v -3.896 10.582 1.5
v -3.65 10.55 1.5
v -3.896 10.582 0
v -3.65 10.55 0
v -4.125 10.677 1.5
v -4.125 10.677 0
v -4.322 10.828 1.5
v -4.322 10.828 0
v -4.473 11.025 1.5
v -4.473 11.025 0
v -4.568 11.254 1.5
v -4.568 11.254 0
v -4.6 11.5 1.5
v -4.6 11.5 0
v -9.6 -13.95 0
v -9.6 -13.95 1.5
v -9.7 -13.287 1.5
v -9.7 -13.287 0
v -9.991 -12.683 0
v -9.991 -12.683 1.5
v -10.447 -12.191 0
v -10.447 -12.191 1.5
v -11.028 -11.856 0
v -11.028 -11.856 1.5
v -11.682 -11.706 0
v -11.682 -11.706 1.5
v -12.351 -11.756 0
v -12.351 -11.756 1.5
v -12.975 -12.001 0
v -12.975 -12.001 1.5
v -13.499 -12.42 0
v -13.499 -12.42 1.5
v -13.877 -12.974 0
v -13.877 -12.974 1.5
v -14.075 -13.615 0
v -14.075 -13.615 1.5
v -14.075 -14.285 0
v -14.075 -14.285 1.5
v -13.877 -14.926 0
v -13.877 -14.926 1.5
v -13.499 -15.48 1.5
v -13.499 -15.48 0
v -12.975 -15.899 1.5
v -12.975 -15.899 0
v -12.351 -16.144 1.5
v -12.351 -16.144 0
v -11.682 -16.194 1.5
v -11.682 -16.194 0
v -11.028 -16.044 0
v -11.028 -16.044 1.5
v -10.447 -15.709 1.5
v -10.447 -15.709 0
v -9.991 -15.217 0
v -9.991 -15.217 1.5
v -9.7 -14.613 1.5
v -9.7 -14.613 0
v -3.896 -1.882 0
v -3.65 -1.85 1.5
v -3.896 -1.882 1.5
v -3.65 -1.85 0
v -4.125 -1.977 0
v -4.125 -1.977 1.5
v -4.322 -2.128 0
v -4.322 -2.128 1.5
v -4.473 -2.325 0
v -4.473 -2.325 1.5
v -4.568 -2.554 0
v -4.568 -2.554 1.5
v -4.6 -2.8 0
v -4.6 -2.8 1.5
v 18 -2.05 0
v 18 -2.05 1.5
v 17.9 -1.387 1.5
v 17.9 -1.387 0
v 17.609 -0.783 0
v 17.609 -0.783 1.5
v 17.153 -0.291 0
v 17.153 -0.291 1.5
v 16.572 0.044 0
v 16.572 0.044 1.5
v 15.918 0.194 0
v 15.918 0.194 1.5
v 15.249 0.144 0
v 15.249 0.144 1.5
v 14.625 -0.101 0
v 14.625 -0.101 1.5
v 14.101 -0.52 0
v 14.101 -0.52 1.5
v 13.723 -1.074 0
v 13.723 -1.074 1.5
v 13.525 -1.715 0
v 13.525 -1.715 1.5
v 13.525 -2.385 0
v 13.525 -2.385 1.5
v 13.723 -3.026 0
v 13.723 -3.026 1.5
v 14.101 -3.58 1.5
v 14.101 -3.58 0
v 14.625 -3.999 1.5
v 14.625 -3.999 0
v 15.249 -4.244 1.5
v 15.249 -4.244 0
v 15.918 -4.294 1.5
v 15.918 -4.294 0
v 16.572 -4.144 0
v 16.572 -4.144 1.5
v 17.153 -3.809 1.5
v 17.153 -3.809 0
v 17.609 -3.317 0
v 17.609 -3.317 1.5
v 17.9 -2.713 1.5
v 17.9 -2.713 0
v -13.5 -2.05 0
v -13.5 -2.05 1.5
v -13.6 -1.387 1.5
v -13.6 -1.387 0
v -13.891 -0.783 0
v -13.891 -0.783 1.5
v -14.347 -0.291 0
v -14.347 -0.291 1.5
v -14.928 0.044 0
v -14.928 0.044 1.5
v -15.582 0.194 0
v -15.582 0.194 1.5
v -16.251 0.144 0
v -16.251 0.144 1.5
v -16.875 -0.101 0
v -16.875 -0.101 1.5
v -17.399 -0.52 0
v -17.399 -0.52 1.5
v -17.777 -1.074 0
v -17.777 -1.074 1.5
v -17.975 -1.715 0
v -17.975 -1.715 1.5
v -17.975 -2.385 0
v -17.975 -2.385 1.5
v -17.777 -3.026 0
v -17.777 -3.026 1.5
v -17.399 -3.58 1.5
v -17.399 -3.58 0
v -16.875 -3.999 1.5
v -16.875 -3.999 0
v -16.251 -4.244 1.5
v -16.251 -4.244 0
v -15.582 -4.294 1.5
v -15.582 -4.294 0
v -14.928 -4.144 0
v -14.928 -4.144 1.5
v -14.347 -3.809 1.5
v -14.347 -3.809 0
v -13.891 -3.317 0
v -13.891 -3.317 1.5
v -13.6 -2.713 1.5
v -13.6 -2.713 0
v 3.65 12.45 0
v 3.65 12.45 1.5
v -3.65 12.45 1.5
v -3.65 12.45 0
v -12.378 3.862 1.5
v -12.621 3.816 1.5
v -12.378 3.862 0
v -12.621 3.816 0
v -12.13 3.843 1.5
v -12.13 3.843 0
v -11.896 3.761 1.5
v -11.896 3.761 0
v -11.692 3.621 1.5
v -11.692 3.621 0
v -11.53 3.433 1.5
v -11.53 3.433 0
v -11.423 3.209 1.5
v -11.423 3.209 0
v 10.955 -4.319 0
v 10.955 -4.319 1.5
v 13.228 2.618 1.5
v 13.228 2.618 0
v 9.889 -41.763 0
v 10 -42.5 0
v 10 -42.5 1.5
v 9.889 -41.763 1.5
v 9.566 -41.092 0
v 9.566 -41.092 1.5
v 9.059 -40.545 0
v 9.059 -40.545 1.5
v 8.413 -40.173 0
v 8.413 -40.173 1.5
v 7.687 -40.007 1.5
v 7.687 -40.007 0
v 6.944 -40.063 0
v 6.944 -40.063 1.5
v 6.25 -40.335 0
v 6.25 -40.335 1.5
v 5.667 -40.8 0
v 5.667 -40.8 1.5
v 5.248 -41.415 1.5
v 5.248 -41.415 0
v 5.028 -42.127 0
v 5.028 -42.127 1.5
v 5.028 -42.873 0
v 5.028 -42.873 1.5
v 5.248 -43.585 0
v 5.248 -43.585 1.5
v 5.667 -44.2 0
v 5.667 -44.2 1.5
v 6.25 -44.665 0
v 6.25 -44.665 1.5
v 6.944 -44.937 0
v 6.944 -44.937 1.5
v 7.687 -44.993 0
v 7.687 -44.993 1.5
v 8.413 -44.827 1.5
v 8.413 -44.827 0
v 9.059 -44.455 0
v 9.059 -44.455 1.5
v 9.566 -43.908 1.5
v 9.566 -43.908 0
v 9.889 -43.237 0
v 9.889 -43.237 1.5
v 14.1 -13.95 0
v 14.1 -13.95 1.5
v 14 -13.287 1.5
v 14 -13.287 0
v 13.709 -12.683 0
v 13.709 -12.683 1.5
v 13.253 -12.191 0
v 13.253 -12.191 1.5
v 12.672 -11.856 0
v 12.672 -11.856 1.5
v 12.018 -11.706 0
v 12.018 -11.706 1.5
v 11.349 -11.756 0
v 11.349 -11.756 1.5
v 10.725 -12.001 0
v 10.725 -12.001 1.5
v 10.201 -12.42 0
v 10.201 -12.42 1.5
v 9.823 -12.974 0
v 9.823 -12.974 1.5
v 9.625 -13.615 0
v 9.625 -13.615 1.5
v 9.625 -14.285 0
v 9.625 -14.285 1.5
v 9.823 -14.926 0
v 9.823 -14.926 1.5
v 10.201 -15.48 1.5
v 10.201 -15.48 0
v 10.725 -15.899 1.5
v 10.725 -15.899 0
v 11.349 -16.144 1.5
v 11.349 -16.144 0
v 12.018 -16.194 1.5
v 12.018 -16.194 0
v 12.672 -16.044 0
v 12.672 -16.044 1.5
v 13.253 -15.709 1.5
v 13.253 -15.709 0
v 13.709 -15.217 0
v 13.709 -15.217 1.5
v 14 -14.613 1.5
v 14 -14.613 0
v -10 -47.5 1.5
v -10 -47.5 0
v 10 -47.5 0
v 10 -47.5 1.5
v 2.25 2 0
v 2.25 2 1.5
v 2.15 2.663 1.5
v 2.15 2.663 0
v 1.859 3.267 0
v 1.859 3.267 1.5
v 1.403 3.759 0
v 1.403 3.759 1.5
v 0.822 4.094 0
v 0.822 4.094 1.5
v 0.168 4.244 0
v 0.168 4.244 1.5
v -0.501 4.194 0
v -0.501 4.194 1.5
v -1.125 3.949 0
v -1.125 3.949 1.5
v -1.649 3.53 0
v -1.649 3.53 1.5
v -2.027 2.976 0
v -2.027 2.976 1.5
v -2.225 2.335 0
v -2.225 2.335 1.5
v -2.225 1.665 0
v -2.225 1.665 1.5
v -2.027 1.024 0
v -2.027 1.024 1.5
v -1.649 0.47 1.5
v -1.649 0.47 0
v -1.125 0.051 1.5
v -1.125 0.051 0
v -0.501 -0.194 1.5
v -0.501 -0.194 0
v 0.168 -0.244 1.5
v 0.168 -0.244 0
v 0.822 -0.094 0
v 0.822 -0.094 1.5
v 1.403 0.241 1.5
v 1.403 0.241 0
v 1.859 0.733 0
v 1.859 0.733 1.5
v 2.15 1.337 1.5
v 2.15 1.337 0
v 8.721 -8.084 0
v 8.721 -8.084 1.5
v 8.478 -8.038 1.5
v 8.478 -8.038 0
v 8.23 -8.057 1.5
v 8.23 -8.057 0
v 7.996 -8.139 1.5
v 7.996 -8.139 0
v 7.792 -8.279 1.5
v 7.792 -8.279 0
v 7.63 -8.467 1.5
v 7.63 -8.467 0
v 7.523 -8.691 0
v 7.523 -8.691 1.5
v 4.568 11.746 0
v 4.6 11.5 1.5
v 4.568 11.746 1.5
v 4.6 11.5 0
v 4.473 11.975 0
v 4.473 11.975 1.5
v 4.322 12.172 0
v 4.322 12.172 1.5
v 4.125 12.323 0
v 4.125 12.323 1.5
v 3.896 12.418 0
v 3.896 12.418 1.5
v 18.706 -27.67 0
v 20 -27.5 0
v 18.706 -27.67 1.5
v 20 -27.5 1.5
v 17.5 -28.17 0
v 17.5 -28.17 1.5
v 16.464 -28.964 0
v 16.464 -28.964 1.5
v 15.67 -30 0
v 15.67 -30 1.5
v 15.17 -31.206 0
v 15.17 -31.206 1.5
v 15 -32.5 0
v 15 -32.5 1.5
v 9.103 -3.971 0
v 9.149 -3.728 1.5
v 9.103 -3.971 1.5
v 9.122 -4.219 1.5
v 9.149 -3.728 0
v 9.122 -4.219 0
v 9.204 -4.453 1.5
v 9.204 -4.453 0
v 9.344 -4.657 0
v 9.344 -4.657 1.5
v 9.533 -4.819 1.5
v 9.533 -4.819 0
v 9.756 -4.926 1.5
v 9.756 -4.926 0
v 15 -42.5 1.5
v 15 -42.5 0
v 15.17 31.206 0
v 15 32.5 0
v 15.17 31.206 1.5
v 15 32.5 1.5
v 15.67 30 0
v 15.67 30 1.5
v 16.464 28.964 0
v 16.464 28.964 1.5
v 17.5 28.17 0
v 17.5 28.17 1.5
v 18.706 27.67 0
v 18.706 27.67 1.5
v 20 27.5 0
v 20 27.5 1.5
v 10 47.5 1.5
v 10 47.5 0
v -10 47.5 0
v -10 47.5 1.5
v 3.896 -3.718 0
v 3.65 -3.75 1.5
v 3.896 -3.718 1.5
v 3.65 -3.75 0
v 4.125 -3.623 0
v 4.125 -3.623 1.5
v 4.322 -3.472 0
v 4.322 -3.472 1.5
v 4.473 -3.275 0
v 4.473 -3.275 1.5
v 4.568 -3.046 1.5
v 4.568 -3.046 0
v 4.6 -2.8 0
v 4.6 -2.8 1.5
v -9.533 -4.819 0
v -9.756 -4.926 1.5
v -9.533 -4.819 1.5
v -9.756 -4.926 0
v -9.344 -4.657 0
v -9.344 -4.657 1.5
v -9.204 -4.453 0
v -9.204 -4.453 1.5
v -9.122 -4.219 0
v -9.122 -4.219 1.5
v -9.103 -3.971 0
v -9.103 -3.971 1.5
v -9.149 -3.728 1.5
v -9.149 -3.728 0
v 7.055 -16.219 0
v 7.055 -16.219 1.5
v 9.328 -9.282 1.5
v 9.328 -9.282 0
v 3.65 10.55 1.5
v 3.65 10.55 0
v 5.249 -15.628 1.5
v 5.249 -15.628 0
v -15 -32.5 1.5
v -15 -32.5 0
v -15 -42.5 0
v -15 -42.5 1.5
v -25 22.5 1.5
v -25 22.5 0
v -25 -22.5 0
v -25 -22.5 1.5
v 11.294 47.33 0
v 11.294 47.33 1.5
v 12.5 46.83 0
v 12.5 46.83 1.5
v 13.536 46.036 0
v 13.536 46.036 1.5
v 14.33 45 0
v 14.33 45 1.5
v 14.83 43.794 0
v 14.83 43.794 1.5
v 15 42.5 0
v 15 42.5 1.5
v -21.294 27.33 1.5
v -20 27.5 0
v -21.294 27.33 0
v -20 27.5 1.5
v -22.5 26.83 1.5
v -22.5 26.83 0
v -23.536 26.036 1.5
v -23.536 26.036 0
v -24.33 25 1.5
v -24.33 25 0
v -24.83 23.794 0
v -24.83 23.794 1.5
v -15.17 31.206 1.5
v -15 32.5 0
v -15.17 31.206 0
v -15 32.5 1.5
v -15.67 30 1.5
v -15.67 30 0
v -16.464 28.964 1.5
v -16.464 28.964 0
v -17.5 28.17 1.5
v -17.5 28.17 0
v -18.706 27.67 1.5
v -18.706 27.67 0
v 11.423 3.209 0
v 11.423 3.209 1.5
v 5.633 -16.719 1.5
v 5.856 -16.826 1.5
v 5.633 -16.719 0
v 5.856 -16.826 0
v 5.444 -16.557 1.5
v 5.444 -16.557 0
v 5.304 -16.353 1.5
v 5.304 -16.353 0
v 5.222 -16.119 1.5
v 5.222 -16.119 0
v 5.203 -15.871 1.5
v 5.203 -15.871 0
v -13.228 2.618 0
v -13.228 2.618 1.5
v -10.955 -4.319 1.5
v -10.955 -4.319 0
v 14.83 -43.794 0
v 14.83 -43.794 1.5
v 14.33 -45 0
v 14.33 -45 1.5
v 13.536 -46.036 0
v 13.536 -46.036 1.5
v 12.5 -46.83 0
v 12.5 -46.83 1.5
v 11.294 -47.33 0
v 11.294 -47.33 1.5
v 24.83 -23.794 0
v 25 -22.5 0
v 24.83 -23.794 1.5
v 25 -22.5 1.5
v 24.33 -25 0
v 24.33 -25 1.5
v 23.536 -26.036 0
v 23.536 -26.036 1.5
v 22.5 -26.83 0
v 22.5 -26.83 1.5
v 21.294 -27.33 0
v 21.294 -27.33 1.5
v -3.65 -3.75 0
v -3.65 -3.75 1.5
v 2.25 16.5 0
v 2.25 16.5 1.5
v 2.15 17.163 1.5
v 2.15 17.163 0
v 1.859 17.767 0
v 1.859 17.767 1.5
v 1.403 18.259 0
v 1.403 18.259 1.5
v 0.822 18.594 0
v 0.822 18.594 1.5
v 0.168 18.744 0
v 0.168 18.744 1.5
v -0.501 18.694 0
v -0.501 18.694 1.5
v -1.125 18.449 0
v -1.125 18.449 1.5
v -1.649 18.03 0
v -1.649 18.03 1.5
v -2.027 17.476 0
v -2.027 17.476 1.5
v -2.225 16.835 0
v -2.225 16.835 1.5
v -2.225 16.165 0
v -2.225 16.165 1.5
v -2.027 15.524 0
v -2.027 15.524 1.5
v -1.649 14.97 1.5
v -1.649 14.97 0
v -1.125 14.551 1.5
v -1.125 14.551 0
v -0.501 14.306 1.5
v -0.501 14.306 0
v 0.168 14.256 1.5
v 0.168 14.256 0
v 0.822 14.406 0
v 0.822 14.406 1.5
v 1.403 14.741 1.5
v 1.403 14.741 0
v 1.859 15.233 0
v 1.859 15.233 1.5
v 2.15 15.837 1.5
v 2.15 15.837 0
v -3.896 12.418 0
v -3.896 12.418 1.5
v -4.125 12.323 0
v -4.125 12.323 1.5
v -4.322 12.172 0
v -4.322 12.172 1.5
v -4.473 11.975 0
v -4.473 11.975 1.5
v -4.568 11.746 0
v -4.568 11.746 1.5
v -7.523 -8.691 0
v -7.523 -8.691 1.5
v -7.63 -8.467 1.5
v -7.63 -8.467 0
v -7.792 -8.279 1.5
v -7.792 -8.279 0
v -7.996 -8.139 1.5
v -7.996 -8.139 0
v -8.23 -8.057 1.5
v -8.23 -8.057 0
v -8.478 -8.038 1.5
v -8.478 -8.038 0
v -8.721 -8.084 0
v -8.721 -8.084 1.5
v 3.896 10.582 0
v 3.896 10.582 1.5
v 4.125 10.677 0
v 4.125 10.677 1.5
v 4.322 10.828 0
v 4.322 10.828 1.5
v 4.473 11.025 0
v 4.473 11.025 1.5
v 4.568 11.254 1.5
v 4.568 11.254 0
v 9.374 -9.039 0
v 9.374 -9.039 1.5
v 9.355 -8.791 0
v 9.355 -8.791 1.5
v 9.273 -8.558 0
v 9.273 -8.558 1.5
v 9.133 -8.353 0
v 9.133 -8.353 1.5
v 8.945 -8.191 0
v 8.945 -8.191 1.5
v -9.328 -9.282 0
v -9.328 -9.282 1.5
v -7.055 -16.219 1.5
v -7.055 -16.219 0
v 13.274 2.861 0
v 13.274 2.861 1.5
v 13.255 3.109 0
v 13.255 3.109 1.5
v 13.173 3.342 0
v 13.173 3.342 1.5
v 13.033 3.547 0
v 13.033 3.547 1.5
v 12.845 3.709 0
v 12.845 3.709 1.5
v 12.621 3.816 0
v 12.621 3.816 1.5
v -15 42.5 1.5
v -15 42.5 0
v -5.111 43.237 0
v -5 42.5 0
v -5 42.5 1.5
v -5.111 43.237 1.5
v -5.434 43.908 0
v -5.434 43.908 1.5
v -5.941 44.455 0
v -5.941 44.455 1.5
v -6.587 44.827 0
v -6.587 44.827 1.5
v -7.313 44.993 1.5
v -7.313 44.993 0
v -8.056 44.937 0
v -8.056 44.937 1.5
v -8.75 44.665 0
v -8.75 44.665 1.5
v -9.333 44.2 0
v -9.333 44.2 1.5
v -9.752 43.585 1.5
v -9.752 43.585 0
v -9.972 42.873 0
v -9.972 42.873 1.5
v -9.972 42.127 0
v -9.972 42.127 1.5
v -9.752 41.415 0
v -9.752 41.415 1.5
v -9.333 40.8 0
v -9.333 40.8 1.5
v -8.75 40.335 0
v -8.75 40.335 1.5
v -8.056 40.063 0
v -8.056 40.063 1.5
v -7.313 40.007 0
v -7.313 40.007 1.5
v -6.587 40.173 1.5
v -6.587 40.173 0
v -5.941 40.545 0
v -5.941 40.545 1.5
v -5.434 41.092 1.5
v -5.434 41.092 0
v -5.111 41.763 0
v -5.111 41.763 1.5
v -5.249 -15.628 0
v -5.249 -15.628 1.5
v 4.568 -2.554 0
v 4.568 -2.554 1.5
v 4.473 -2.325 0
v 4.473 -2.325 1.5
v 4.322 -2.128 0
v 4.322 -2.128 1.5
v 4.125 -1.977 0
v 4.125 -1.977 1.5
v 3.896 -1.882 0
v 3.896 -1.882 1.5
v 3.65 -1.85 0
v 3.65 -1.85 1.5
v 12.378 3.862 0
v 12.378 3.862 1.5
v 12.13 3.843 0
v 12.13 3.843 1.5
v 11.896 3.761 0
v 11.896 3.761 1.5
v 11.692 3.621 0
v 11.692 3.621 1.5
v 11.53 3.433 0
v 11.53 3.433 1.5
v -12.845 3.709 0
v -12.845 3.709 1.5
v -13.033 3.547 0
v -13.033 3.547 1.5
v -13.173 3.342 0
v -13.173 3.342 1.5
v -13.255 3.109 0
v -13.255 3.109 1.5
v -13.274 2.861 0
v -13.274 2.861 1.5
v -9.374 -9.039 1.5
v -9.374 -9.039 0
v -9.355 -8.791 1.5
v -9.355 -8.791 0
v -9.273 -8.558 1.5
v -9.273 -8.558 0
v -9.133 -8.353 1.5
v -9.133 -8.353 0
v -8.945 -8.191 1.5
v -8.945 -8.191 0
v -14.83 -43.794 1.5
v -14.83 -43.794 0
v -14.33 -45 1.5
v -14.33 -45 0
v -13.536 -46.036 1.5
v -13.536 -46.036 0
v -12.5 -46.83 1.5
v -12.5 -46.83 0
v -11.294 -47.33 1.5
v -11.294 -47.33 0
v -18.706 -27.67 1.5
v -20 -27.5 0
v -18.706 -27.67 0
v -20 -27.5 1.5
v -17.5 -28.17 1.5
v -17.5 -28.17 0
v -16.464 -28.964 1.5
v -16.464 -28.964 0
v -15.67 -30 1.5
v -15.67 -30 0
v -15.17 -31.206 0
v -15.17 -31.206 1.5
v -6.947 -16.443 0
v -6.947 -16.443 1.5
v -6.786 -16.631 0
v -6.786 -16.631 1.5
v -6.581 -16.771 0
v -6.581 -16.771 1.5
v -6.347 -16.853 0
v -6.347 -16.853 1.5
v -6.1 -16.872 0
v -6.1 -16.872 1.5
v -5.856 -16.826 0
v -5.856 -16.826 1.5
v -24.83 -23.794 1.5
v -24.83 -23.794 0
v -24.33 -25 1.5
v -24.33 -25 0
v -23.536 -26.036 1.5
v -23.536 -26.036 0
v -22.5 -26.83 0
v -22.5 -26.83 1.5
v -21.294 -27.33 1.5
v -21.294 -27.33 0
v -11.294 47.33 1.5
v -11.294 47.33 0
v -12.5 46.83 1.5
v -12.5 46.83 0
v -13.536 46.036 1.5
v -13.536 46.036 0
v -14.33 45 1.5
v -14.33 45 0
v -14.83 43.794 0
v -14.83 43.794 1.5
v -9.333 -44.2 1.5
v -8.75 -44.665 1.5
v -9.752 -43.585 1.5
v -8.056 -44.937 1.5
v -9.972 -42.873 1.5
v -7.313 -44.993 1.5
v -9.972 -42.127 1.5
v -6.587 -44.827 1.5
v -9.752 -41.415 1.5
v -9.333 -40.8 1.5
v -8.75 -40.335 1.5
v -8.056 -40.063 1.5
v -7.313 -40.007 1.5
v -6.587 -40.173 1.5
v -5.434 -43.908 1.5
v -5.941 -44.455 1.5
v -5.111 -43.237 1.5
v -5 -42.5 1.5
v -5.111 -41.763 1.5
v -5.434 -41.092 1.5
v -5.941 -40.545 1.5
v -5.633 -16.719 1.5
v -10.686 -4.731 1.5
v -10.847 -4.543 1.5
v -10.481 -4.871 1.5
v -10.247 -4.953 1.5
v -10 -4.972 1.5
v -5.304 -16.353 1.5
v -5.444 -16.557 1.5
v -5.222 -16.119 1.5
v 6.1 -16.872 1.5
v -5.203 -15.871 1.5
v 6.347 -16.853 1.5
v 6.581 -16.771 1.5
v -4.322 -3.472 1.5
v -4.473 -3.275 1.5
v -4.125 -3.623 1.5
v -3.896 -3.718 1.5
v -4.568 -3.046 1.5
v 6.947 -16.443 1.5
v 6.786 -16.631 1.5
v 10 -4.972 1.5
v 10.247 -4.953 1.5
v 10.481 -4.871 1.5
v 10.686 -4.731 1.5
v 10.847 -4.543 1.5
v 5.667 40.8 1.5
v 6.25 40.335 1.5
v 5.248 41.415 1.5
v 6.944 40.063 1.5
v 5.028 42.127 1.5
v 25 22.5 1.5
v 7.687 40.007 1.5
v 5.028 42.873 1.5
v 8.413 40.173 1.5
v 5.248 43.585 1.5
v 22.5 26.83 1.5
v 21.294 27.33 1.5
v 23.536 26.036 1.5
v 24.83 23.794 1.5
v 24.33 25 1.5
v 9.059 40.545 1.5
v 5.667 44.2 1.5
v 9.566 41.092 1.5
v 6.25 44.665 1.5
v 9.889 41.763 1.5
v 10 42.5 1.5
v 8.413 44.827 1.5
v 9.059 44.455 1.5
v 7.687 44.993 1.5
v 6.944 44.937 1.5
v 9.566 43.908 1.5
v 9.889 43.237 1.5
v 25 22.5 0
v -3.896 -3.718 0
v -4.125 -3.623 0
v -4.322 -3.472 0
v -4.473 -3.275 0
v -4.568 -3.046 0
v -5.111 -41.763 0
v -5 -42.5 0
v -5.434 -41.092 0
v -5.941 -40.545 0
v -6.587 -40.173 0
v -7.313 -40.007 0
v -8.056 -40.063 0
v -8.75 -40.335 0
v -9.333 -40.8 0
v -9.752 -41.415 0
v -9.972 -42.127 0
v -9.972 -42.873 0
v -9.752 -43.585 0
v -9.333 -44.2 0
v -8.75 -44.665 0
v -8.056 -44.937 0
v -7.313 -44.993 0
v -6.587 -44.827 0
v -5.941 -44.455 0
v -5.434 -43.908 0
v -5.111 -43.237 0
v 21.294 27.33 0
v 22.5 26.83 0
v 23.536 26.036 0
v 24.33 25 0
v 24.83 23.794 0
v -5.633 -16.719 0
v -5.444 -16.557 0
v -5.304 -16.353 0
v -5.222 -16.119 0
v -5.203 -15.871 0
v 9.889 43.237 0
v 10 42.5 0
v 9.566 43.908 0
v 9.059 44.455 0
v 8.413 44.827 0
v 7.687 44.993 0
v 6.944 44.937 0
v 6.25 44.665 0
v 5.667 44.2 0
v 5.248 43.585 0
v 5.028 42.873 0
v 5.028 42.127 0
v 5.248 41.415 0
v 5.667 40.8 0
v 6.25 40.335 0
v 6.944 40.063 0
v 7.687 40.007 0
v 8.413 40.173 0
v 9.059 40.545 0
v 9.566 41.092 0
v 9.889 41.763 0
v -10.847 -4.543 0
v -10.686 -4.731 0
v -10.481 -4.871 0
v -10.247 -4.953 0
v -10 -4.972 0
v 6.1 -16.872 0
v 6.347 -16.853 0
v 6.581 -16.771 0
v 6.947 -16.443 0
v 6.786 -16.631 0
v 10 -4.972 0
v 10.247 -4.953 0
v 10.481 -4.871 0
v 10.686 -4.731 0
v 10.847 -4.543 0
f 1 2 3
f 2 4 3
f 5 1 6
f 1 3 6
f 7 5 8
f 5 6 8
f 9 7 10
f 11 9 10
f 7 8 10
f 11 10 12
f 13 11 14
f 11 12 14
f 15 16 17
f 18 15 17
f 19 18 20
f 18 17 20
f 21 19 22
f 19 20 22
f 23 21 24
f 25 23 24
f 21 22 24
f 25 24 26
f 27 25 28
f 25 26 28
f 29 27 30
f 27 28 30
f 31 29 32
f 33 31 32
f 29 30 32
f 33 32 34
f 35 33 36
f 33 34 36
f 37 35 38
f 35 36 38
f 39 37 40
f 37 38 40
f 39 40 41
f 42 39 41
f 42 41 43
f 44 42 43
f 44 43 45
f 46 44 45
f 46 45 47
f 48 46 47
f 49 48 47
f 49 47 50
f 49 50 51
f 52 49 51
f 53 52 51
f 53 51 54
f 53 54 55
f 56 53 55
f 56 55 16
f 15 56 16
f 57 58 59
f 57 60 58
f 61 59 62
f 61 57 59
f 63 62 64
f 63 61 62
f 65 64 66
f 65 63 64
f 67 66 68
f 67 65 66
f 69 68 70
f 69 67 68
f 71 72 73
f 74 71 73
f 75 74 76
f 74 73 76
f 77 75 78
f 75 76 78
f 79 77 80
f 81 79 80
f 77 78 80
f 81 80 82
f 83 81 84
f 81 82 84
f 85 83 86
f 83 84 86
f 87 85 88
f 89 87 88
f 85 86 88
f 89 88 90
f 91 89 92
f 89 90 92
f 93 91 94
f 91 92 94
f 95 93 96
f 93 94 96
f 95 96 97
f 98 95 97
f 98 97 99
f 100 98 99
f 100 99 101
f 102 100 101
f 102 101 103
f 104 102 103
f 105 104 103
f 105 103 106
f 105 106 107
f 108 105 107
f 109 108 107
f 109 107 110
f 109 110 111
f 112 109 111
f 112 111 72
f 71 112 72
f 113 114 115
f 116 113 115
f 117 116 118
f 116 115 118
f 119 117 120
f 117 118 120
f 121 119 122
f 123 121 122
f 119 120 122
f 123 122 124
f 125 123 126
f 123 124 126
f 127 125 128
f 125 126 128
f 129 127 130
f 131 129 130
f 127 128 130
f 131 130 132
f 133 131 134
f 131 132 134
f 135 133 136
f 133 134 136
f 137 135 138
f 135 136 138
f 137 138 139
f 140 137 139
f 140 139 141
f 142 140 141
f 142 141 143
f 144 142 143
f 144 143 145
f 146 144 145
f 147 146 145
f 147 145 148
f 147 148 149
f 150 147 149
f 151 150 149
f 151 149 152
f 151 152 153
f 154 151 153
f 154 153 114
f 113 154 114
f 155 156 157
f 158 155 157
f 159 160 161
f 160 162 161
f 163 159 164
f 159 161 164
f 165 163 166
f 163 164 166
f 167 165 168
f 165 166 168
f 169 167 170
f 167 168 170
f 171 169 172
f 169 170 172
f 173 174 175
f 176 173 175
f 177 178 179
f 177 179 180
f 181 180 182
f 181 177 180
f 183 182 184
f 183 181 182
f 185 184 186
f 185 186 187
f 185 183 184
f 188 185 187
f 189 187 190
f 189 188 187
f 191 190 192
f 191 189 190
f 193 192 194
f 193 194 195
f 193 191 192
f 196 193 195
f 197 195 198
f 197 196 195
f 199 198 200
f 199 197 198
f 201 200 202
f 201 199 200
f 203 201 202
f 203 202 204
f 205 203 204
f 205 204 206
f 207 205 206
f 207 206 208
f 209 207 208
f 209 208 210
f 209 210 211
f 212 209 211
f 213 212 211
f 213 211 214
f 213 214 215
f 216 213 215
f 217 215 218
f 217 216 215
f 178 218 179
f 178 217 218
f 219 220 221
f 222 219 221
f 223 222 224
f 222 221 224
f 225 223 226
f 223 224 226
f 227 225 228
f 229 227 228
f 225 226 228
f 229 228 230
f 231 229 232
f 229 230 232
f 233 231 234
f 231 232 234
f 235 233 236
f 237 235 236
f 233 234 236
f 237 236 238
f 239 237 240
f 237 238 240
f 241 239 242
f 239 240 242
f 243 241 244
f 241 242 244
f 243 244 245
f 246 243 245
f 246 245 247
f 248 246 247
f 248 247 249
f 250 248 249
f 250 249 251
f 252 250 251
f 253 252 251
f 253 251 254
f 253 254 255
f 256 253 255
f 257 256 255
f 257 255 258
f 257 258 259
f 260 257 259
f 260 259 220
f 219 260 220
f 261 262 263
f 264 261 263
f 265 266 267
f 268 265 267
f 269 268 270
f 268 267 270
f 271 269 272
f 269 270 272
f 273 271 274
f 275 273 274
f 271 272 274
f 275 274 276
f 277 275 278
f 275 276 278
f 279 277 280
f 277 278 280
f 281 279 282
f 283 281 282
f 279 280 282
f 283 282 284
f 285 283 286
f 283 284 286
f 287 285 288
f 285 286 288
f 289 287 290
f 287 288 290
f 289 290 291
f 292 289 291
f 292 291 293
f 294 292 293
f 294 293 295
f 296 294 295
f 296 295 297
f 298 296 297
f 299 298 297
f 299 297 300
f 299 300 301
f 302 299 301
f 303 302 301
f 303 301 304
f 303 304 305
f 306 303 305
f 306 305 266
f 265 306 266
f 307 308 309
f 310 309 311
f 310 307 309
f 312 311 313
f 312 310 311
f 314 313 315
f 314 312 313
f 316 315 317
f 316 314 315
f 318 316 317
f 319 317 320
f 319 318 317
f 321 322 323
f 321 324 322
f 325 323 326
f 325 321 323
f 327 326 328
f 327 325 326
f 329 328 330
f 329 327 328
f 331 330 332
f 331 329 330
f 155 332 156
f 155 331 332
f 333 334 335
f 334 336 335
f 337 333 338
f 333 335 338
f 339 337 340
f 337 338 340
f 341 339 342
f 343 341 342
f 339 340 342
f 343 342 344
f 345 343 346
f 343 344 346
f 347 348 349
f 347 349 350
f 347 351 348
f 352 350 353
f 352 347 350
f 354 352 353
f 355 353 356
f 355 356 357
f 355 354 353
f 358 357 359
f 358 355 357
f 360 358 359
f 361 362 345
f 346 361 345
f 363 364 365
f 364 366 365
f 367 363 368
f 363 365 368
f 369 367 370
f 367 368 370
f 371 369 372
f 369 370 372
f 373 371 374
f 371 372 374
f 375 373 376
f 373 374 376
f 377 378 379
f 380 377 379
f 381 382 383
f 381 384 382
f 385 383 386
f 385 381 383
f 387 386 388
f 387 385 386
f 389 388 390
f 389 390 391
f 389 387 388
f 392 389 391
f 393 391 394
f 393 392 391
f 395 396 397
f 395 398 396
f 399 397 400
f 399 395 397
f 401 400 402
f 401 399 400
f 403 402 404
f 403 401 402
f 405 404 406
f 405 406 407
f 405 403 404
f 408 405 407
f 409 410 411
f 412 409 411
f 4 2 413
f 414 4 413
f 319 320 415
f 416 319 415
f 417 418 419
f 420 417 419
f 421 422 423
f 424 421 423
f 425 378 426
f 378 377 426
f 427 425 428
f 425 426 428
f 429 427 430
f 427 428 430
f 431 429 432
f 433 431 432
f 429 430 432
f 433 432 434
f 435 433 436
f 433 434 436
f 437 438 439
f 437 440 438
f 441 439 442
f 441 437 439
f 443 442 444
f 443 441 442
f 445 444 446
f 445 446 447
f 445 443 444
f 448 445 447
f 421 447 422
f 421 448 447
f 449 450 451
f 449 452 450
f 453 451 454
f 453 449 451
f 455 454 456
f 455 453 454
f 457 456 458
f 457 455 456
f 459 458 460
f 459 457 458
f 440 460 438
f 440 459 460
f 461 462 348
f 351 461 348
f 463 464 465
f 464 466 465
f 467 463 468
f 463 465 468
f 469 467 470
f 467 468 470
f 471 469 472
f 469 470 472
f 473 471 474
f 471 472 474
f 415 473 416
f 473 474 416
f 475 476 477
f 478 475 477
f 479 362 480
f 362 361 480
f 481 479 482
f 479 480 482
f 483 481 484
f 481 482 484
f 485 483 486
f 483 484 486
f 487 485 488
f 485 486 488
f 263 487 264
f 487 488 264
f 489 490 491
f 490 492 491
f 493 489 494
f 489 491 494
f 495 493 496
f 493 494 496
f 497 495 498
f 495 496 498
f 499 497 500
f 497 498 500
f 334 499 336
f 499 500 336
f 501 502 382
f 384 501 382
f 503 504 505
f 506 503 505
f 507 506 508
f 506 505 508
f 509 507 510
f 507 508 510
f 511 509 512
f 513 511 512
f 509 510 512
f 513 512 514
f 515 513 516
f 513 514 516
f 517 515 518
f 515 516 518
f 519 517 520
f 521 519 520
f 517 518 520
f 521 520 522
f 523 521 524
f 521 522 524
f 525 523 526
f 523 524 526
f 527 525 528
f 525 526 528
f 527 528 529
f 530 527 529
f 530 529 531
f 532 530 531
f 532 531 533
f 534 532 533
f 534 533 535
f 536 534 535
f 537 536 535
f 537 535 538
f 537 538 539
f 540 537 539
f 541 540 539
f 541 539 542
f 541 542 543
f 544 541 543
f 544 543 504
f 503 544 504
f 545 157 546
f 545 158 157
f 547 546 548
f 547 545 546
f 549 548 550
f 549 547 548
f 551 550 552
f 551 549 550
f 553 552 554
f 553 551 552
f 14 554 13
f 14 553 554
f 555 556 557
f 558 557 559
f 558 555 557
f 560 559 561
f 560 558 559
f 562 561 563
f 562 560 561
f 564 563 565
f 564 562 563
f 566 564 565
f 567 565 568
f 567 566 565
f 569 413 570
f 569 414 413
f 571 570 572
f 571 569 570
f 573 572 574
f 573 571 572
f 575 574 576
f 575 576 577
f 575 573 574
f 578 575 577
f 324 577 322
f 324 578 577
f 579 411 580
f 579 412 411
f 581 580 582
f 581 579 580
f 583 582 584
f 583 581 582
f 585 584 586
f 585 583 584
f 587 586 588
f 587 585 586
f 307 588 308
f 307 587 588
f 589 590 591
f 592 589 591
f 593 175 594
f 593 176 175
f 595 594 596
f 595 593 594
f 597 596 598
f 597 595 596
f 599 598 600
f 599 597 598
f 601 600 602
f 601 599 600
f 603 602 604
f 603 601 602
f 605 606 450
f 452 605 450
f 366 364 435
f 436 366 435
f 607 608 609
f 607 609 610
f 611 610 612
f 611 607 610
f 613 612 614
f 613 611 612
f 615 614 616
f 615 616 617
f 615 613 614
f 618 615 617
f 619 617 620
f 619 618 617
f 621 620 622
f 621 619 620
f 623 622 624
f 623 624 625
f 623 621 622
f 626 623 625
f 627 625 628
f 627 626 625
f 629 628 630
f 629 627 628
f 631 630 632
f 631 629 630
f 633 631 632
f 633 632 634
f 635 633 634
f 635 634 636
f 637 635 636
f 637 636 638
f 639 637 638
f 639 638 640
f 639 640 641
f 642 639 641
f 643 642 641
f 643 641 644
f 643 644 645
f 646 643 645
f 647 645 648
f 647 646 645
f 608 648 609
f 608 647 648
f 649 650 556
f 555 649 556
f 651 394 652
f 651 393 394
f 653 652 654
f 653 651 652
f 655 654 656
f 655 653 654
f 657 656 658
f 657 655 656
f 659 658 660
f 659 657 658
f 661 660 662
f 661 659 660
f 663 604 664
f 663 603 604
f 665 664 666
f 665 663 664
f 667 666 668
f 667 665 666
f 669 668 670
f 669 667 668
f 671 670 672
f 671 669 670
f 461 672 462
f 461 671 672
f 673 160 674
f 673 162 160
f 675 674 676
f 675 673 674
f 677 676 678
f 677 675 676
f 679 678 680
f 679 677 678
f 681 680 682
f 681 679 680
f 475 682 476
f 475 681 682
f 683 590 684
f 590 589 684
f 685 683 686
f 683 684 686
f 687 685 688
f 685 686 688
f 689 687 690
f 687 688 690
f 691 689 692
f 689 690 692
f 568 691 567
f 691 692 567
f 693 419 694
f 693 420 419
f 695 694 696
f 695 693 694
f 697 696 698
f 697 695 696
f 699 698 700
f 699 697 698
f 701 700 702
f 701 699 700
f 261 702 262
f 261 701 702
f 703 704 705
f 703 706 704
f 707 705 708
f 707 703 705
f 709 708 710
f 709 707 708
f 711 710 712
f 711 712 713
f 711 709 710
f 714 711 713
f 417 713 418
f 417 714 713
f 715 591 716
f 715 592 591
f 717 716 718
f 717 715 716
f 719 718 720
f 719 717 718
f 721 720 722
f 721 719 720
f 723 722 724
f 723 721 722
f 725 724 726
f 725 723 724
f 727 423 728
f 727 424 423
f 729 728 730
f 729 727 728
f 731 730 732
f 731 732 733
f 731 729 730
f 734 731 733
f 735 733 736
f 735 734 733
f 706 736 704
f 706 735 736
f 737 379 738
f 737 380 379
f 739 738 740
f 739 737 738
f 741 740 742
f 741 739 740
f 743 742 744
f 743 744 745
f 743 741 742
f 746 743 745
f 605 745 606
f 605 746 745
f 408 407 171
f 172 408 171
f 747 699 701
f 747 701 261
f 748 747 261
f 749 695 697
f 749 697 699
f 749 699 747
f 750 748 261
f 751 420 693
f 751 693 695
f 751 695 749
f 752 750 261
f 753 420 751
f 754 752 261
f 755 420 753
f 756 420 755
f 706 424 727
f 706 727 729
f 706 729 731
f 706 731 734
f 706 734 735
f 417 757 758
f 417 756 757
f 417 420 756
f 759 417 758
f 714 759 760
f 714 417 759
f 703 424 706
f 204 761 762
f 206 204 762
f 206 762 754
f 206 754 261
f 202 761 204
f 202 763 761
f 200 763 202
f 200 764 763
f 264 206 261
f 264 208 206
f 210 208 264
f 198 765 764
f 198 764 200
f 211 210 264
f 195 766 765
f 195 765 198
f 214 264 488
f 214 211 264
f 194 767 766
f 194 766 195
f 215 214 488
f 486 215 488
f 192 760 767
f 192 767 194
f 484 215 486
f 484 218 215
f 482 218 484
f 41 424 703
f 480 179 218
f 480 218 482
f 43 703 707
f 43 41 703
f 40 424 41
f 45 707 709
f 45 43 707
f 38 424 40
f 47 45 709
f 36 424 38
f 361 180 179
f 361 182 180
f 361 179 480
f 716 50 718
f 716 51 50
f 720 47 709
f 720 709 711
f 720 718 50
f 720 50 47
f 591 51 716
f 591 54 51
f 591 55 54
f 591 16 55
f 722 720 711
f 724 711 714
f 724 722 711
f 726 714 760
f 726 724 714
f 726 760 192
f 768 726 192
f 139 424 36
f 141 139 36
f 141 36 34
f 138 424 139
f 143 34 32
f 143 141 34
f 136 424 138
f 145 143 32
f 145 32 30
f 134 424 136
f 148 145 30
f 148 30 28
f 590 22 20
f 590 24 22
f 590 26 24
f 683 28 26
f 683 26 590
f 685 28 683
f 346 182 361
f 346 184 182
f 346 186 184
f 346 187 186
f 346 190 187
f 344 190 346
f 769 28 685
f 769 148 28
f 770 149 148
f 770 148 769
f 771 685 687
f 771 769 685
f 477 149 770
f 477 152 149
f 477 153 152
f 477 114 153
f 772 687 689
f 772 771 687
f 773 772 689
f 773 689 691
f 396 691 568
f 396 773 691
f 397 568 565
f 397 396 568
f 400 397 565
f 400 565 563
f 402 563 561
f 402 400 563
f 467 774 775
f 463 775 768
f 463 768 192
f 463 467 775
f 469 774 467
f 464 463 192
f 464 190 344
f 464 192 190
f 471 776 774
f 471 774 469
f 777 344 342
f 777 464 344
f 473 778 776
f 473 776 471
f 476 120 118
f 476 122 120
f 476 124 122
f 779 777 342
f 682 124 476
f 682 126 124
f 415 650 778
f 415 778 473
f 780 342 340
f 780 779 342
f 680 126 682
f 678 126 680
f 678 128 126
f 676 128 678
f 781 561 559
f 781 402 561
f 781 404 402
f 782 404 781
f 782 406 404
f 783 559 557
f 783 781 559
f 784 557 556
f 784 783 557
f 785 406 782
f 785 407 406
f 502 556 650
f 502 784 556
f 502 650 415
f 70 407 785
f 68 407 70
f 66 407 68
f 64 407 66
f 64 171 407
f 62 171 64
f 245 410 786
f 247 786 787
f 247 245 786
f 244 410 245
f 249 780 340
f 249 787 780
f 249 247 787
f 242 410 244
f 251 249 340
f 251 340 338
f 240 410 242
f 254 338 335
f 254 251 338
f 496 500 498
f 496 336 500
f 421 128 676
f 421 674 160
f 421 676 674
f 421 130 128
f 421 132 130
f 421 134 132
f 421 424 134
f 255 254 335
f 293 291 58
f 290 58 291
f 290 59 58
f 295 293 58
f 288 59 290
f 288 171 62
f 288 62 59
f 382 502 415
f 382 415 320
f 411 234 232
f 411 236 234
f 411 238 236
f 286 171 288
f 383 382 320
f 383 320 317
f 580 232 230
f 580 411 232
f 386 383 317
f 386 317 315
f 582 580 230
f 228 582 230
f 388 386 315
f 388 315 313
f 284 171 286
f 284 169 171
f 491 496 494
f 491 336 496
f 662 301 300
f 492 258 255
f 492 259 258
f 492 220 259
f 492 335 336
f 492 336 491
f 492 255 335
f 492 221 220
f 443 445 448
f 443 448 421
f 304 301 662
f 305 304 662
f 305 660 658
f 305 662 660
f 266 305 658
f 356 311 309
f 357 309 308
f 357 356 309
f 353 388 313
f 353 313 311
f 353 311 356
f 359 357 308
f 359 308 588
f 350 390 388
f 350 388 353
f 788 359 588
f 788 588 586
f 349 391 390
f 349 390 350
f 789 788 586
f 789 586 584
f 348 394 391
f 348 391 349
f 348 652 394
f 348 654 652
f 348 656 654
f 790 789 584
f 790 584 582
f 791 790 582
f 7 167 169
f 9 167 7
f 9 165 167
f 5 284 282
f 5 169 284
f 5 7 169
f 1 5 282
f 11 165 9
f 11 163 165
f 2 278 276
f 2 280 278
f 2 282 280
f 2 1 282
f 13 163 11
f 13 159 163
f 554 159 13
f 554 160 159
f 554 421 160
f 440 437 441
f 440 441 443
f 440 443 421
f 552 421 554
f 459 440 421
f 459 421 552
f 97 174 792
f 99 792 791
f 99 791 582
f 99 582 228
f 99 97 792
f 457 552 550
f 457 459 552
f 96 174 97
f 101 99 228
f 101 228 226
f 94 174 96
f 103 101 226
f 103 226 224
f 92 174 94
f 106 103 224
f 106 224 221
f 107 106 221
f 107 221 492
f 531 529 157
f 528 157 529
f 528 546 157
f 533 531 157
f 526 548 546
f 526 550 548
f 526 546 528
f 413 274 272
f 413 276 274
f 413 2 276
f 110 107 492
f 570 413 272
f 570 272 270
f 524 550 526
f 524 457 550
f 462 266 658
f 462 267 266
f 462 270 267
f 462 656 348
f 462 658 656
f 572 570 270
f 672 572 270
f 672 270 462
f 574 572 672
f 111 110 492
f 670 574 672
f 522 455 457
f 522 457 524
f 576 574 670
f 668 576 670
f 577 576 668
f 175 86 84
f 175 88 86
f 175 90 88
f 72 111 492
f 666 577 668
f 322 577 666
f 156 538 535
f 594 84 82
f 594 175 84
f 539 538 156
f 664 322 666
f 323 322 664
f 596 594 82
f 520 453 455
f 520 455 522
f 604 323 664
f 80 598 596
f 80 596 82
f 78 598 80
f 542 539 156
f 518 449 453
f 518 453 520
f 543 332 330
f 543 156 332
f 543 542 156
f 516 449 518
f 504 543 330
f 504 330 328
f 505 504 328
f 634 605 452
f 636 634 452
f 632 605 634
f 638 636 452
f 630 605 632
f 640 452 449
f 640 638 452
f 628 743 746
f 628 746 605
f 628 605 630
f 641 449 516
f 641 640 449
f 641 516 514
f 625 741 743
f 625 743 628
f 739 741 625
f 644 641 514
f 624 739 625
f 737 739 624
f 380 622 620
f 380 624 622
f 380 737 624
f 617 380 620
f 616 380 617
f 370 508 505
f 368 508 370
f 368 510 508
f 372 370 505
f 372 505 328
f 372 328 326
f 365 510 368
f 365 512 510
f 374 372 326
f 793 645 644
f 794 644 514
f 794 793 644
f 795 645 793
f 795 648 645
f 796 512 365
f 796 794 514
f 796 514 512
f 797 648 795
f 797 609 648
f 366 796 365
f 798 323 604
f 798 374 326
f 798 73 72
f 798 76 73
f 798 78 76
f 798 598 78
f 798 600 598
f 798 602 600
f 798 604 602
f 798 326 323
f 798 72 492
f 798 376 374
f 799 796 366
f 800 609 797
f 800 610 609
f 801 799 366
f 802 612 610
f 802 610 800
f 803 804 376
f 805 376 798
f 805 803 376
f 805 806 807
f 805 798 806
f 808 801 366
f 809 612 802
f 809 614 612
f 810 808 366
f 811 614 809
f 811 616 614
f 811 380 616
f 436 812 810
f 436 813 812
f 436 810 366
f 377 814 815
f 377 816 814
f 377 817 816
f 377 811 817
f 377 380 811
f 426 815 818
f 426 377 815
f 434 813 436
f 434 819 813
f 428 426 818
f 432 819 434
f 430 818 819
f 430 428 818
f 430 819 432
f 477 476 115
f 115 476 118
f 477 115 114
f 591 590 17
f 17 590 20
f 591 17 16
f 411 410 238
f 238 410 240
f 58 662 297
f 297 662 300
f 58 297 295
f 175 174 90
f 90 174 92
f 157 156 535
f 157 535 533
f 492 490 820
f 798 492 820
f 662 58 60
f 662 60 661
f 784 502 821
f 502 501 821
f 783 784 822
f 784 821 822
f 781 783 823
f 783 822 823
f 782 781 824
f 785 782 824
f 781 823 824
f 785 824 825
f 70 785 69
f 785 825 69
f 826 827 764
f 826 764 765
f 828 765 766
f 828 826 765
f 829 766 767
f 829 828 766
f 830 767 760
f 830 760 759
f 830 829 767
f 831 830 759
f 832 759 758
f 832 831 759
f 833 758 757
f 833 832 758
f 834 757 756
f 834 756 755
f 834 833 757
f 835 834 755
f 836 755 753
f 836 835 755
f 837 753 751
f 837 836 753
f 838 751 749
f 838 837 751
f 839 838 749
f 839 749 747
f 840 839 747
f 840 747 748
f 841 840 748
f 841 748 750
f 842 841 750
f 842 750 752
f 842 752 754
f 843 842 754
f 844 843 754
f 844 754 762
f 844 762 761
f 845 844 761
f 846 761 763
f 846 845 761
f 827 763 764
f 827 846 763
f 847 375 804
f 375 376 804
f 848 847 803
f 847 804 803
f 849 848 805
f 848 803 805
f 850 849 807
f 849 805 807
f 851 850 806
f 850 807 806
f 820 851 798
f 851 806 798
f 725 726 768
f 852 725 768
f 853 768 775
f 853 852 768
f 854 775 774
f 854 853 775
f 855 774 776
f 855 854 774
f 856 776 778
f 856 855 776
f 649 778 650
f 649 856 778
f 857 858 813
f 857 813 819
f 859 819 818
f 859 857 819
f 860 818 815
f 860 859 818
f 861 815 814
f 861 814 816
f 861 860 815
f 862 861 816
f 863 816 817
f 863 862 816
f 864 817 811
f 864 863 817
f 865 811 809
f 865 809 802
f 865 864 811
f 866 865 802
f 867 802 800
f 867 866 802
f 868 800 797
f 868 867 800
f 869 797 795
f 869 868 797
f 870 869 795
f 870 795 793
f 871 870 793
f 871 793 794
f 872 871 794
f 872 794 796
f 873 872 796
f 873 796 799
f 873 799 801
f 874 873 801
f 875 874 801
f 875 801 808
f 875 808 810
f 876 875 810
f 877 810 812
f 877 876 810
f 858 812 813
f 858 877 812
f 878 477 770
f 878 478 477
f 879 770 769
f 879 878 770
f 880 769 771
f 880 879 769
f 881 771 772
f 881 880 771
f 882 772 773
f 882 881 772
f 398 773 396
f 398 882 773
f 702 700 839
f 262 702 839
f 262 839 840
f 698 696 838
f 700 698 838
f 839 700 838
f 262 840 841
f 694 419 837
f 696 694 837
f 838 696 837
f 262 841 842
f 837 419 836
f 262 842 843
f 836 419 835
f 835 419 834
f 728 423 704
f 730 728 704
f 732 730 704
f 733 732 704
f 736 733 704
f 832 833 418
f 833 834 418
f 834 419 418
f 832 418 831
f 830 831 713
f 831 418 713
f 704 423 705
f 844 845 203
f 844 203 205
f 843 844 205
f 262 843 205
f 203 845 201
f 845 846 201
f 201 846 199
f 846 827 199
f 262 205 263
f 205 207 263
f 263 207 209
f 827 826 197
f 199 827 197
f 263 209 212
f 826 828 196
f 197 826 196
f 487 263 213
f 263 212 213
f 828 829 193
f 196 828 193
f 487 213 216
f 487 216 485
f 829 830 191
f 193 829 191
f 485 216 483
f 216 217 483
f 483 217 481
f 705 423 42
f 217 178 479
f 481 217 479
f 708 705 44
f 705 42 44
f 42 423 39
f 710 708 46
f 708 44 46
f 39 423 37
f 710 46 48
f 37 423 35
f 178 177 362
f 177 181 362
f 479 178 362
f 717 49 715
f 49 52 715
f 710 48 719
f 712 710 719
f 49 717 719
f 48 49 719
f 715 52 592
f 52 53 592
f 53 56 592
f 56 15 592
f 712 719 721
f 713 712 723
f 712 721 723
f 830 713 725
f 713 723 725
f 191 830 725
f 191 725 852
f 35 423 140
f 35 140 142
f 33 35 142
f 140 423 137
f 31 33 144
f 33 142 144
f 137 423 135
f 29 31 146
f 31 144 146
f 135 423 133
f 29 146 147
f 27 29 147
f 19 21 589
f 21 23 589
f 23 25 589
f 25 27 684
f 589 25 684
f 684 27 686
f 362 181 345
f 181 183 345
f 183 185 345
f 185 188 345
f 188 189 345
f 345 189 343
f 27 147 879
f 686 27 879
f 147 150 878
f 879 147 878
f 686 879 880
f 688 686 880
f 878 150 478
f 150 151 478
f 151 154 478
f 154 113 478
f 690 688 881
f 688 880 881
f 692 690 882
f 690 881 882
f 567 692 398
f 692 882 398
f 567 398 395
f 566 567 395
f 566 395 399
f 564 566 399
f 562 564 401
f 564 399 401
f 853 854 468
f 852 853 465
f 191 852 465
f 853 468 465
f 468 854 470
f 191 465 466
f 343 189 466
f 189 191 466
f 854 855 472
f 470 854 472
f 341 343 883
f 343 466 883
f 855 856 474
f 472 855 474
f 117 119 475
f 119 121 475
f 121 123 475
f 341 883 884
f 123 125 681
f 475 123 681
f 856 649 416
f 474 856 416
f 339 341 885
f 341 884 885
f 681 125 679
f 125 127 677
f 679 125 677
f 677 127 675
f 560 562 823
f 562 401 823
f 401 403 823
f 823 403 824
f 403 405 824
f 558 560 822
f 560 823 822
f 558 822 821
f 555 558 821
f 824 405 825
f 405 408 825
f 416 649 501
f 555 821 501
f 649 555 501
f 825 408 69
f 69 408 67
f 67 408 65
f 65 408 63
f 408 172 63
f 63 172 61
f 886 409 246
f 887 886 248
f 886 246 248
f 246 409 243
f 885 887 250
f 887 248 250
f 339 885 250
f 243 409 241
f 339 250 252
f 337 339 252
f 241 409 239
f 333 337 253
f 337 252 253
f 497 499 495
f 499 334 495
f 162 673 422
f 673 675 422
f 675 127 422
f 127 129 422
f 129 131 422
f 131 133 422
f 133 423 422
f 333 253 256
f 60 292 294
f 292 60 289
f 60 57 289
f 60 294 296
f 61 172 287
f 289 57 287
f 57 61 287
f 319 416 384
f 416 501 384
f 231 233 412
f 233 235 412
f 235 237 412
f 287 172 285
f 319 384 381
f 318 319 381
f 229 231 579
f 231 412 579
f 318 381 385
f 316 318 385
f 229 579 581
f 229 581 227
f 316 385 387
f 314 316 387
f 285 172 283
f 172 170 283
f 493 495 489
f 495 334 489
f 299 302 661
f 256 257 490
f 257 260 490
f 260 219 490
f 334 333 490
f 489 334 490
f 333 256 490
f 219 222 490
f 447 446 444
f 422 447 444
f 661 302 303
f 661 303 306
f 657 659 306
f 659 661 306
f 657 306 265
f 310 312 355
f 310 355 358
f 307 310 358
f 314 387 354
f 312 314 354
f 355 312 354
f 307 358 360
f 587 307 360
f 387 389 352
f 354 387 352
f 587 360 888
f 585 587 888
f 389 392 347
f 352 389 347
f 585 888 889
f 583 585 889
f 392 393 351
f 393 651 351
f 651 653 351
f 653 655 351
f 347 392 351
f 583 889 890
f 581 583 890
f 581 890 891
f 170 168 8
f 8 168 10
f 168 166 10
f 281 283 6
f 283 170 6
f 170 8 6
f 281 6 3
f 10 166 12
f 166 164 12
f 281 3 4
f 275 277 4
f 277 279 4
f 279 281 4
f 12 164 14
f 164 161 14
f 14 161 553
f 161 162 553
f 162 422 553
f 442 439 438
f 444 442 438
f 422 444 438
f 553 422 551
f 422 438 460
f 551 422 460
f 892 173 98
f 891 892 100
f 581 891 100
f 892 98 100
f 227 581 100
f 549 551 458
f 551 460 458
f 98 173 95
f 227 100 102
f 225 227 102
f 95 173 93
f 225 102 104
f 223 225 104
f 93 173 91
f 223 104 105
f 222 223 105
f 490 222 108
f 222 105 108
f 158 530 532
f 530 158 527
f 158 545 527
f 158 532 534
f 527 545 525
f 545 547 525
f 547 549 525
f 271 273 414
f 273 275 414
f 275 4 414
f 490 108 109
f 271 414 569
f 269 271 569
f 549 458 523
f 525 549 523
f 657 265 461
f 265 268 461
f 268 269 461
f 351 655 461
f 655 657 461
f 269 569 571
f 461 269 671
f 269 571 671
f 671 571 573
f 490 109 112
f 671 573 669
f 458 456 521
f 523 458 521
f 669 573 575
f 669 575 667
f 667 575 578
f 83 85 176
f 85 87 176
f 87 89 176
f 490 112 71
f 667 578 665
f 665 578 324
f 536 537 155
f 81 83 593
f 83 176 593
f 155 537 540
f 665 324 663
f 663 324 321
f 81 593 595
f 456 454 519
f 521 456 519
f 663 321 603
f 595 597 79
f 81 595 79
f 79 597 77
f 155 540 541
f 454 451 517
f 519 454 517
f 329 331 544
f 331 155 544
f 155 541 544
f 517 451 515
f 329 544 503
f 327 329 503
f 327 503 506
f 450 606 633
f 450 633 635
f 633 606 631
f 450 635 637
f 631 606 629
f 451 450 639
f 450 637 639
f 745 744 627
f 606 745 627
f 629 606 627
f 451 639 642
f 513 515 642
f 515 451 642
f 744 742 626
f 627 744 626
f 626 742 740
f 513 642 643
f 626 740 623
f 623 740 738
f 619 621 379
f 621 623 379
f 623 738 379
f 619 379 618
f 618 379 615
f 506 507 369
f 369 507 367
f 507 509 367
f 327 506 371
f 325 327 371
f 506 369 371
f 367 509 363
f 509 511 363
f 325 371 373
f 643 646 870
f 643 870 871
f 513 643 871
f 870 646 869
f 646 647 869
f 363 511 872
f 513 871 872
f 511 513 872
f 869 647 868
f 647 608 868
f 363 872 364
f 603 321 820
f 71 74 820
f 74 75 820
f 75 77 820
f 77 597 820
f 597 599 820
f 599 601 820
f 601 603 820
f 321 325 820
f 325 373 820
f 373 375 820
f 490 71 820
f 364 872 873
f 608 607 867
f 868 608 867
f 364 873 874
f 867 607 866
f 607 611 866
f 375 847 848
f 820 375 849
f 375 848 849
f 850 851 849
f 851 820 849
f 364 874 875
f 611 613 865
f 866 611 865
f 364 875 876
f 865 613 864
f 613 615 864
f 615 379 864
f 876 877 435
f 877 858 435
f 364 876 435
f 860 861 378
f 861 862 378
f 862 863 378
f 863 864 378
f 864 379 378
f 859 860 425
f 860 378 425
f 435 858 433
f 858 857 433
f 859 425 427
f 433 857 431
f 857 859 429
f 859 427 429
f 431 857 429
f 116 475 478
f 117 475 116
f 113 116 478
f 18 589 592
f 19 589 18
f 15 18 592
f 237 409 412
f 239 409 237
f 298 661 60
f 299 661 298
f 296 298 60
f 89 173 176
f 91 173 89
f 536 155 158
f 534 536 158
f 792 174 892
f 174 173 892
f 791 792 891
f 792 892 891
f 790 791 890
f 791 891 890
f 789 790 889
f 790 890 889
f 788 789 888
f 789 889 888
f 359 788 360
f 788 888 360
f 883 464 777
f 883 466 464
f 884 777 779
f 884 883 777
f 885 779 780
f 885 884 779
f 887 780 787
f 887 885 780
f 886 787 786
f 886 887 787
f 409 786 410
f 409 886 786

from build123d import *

# Parameters (mm, degrees)
F0_R     = 2.5
F1_DEPTH = 1.5
F2_R     = 4.99999
F3_R     = 2.25
F4_DEPTH = 25
F5_W     = 4.6
F5_H     = 1.9
F5_W_2   = 9.2
F6_DEPTH = 25
F7_R     = 0.94999


# Not quite as in the source:
# - a fillet or chamfer is up to 0.001 mm smaller than in the source, because OpenCascade refuses the exact size


with BuildPart() as f1:
    # F0 (on Top) → F1 (new body)
    with BuildSketch(Plane.XY):
        Polygon((15, 47.5), (-15, 47.5), (-15, 27.5), (-25, 27.5), (-25, -27.5), (-15, -27.5), (-15, -47.5), (15, -47.5), (15, -27.5), (25, -27.5), (25, 27.5), (15, 27.5), align=None)
        with Locations((-7.5, -42.5)):
            Circle(F0_R, mode=Mode.SUBTRACT)
        with Locations((7.5, -42.5)):
            Circle(F0_R, mode=Mode.SUBTRACT)
        with Locations((-7.5, 42.5)):
            Circle(F0_R, mode=Mode.SUBTRACT)
        with Locations((7.5, 42.5)):
            Circle(F0_R, mode=Mode.SUBTRACT)
    extrude(amount=F1_DEPTH)

    # F2 (radius 5 in the source; OpenCascade refuses exactly that, so slightly less here)
    f2_edges = [f1.edges().sort_by_distance(p)[0] for p in [
        (15, 47.5, 0.75),
        (15, 27.5, 0.75),
        (25, 27.5, 0.75),
        (25, -27.5, 0.75),
        (15, -47.5, 0.75),
        (-15, 47.5, 0.75),
        (-15, 27.5, 0.75),
        (-25, 27.5, 0.75),
        (-25, -27.5, 0.75),
        (-15, -47.5, 0.75),
        (-15, -27.5, 0.75),
        (15, -27.5, 0.75),
    ]]
    fillet(f2_edges, radius=F2_R)

    # F3 (on face) → F4 (cut)
    with BuildSketch(Plane.XY.offset(1.5)):
        with Locations((0, 16.5)):
            Circle(F3_R)
        with Locations((0, 2)):
            Circle(F3_R)
        with Locations((15.75, -2.05)):
            Circle(F3_R)
        with Locations((-15.75, -2.05)):
            Circle(F3_R)
        with Locations((11.85, -13.95)):
            Circle(F3_R)
        with Locations((-11.85, -13.95)):
            Circle(F3_R)
    extrude(amount=-F4_DEPTH, mode=Mode.SUBTRACT)

    # F5 (on face) → F6 (cut)
    with BuildSketch(Plane.XY.offset(1.5)):
        with Locations((-2.3, 11.5)):
            Rectangle(F5_W, F5_H)
        with Locations((2.3, 11.5)):
            Rectangle(F5_W, F5_H)
        with Locations((0, -2.8)):
            Rectangle(F5_W_2, F5_H)
        Polygon((-11.7185466768, 4.111970797), (-13.524056425, 3.5202491148), (-10.6588777534, -5.2222191396), (-8.8533680052, -4.6304974575), align=None)
        Polygon((-9.624056425, -8.3797508852), (-6.7588777534, -17.1222191396), (-4.9533680052, -16.5304974575), (-7.8185466768, -7.788029203), align=None)
        Polygon((10.6588777534, -5.2222191396), (13.524056425, 3.5202491148), (11.7185466768, 4.111970797), (8.8533680052, -4.6304974575), align=None)
        Polygon((4.9533680052, -16.5304974575), (6.7588777534, -17.1222191396), (9.624056425, -8.3797508852), (7.8185466768, -7.788029203), align=None)
    extrude(amount=-F6_DEPTH, mode=Mode.SUBTRACT)

    # F7 (radius 0.95 in the source; OpenCascade refuses exactly that, so slightly less here)
    f7_edges = [f1.edges().sort_by_distance(p)[0] for p in [
        (13.524056, 3.520249, 0.75),
        (-8.853368, -4.630497, 0.75),
        (9.624056, -8.379751, 0.75),
        (-4.953368, -16.530497, 0.75),
        (-13.524056, 3.520249, 0.75),
        (-9.624056, -8.379751, 0.75),
        (8.853368, -4.630497, 0.75),
        (4.953368, -16.530497, 0.75),
        (-4.6, 12.45, 0.75),
        (-4.6, -1.85, 0.75),
        (-11.718547, 4.111971, 0.75),
        (11.718547, 4.111971, 0.75),
        (-7.818547, -7.788029, 0.75),
        (7.818547, -7.788029, 0.75),
        (4.6, -1.85, 0.75),
        (4.6, 12.45, 0.75),
        (10.658878, -5.222219, 0.75),
        (-10.658878, -5.222219, 0.75),
        (-4.6, -3.75, 0.75),
        (-4.6, 10.55, 0.75),
        (4.6, 10.55, 0.75),
        (4.6, -3.75, 0.75),
        (-6.758878, -17.122219, 0.75),
        (6.758878, -17.122219, 0.75),
    ]]
    fillet(f7_edges, radius=F7_R)


solid = f1.part
